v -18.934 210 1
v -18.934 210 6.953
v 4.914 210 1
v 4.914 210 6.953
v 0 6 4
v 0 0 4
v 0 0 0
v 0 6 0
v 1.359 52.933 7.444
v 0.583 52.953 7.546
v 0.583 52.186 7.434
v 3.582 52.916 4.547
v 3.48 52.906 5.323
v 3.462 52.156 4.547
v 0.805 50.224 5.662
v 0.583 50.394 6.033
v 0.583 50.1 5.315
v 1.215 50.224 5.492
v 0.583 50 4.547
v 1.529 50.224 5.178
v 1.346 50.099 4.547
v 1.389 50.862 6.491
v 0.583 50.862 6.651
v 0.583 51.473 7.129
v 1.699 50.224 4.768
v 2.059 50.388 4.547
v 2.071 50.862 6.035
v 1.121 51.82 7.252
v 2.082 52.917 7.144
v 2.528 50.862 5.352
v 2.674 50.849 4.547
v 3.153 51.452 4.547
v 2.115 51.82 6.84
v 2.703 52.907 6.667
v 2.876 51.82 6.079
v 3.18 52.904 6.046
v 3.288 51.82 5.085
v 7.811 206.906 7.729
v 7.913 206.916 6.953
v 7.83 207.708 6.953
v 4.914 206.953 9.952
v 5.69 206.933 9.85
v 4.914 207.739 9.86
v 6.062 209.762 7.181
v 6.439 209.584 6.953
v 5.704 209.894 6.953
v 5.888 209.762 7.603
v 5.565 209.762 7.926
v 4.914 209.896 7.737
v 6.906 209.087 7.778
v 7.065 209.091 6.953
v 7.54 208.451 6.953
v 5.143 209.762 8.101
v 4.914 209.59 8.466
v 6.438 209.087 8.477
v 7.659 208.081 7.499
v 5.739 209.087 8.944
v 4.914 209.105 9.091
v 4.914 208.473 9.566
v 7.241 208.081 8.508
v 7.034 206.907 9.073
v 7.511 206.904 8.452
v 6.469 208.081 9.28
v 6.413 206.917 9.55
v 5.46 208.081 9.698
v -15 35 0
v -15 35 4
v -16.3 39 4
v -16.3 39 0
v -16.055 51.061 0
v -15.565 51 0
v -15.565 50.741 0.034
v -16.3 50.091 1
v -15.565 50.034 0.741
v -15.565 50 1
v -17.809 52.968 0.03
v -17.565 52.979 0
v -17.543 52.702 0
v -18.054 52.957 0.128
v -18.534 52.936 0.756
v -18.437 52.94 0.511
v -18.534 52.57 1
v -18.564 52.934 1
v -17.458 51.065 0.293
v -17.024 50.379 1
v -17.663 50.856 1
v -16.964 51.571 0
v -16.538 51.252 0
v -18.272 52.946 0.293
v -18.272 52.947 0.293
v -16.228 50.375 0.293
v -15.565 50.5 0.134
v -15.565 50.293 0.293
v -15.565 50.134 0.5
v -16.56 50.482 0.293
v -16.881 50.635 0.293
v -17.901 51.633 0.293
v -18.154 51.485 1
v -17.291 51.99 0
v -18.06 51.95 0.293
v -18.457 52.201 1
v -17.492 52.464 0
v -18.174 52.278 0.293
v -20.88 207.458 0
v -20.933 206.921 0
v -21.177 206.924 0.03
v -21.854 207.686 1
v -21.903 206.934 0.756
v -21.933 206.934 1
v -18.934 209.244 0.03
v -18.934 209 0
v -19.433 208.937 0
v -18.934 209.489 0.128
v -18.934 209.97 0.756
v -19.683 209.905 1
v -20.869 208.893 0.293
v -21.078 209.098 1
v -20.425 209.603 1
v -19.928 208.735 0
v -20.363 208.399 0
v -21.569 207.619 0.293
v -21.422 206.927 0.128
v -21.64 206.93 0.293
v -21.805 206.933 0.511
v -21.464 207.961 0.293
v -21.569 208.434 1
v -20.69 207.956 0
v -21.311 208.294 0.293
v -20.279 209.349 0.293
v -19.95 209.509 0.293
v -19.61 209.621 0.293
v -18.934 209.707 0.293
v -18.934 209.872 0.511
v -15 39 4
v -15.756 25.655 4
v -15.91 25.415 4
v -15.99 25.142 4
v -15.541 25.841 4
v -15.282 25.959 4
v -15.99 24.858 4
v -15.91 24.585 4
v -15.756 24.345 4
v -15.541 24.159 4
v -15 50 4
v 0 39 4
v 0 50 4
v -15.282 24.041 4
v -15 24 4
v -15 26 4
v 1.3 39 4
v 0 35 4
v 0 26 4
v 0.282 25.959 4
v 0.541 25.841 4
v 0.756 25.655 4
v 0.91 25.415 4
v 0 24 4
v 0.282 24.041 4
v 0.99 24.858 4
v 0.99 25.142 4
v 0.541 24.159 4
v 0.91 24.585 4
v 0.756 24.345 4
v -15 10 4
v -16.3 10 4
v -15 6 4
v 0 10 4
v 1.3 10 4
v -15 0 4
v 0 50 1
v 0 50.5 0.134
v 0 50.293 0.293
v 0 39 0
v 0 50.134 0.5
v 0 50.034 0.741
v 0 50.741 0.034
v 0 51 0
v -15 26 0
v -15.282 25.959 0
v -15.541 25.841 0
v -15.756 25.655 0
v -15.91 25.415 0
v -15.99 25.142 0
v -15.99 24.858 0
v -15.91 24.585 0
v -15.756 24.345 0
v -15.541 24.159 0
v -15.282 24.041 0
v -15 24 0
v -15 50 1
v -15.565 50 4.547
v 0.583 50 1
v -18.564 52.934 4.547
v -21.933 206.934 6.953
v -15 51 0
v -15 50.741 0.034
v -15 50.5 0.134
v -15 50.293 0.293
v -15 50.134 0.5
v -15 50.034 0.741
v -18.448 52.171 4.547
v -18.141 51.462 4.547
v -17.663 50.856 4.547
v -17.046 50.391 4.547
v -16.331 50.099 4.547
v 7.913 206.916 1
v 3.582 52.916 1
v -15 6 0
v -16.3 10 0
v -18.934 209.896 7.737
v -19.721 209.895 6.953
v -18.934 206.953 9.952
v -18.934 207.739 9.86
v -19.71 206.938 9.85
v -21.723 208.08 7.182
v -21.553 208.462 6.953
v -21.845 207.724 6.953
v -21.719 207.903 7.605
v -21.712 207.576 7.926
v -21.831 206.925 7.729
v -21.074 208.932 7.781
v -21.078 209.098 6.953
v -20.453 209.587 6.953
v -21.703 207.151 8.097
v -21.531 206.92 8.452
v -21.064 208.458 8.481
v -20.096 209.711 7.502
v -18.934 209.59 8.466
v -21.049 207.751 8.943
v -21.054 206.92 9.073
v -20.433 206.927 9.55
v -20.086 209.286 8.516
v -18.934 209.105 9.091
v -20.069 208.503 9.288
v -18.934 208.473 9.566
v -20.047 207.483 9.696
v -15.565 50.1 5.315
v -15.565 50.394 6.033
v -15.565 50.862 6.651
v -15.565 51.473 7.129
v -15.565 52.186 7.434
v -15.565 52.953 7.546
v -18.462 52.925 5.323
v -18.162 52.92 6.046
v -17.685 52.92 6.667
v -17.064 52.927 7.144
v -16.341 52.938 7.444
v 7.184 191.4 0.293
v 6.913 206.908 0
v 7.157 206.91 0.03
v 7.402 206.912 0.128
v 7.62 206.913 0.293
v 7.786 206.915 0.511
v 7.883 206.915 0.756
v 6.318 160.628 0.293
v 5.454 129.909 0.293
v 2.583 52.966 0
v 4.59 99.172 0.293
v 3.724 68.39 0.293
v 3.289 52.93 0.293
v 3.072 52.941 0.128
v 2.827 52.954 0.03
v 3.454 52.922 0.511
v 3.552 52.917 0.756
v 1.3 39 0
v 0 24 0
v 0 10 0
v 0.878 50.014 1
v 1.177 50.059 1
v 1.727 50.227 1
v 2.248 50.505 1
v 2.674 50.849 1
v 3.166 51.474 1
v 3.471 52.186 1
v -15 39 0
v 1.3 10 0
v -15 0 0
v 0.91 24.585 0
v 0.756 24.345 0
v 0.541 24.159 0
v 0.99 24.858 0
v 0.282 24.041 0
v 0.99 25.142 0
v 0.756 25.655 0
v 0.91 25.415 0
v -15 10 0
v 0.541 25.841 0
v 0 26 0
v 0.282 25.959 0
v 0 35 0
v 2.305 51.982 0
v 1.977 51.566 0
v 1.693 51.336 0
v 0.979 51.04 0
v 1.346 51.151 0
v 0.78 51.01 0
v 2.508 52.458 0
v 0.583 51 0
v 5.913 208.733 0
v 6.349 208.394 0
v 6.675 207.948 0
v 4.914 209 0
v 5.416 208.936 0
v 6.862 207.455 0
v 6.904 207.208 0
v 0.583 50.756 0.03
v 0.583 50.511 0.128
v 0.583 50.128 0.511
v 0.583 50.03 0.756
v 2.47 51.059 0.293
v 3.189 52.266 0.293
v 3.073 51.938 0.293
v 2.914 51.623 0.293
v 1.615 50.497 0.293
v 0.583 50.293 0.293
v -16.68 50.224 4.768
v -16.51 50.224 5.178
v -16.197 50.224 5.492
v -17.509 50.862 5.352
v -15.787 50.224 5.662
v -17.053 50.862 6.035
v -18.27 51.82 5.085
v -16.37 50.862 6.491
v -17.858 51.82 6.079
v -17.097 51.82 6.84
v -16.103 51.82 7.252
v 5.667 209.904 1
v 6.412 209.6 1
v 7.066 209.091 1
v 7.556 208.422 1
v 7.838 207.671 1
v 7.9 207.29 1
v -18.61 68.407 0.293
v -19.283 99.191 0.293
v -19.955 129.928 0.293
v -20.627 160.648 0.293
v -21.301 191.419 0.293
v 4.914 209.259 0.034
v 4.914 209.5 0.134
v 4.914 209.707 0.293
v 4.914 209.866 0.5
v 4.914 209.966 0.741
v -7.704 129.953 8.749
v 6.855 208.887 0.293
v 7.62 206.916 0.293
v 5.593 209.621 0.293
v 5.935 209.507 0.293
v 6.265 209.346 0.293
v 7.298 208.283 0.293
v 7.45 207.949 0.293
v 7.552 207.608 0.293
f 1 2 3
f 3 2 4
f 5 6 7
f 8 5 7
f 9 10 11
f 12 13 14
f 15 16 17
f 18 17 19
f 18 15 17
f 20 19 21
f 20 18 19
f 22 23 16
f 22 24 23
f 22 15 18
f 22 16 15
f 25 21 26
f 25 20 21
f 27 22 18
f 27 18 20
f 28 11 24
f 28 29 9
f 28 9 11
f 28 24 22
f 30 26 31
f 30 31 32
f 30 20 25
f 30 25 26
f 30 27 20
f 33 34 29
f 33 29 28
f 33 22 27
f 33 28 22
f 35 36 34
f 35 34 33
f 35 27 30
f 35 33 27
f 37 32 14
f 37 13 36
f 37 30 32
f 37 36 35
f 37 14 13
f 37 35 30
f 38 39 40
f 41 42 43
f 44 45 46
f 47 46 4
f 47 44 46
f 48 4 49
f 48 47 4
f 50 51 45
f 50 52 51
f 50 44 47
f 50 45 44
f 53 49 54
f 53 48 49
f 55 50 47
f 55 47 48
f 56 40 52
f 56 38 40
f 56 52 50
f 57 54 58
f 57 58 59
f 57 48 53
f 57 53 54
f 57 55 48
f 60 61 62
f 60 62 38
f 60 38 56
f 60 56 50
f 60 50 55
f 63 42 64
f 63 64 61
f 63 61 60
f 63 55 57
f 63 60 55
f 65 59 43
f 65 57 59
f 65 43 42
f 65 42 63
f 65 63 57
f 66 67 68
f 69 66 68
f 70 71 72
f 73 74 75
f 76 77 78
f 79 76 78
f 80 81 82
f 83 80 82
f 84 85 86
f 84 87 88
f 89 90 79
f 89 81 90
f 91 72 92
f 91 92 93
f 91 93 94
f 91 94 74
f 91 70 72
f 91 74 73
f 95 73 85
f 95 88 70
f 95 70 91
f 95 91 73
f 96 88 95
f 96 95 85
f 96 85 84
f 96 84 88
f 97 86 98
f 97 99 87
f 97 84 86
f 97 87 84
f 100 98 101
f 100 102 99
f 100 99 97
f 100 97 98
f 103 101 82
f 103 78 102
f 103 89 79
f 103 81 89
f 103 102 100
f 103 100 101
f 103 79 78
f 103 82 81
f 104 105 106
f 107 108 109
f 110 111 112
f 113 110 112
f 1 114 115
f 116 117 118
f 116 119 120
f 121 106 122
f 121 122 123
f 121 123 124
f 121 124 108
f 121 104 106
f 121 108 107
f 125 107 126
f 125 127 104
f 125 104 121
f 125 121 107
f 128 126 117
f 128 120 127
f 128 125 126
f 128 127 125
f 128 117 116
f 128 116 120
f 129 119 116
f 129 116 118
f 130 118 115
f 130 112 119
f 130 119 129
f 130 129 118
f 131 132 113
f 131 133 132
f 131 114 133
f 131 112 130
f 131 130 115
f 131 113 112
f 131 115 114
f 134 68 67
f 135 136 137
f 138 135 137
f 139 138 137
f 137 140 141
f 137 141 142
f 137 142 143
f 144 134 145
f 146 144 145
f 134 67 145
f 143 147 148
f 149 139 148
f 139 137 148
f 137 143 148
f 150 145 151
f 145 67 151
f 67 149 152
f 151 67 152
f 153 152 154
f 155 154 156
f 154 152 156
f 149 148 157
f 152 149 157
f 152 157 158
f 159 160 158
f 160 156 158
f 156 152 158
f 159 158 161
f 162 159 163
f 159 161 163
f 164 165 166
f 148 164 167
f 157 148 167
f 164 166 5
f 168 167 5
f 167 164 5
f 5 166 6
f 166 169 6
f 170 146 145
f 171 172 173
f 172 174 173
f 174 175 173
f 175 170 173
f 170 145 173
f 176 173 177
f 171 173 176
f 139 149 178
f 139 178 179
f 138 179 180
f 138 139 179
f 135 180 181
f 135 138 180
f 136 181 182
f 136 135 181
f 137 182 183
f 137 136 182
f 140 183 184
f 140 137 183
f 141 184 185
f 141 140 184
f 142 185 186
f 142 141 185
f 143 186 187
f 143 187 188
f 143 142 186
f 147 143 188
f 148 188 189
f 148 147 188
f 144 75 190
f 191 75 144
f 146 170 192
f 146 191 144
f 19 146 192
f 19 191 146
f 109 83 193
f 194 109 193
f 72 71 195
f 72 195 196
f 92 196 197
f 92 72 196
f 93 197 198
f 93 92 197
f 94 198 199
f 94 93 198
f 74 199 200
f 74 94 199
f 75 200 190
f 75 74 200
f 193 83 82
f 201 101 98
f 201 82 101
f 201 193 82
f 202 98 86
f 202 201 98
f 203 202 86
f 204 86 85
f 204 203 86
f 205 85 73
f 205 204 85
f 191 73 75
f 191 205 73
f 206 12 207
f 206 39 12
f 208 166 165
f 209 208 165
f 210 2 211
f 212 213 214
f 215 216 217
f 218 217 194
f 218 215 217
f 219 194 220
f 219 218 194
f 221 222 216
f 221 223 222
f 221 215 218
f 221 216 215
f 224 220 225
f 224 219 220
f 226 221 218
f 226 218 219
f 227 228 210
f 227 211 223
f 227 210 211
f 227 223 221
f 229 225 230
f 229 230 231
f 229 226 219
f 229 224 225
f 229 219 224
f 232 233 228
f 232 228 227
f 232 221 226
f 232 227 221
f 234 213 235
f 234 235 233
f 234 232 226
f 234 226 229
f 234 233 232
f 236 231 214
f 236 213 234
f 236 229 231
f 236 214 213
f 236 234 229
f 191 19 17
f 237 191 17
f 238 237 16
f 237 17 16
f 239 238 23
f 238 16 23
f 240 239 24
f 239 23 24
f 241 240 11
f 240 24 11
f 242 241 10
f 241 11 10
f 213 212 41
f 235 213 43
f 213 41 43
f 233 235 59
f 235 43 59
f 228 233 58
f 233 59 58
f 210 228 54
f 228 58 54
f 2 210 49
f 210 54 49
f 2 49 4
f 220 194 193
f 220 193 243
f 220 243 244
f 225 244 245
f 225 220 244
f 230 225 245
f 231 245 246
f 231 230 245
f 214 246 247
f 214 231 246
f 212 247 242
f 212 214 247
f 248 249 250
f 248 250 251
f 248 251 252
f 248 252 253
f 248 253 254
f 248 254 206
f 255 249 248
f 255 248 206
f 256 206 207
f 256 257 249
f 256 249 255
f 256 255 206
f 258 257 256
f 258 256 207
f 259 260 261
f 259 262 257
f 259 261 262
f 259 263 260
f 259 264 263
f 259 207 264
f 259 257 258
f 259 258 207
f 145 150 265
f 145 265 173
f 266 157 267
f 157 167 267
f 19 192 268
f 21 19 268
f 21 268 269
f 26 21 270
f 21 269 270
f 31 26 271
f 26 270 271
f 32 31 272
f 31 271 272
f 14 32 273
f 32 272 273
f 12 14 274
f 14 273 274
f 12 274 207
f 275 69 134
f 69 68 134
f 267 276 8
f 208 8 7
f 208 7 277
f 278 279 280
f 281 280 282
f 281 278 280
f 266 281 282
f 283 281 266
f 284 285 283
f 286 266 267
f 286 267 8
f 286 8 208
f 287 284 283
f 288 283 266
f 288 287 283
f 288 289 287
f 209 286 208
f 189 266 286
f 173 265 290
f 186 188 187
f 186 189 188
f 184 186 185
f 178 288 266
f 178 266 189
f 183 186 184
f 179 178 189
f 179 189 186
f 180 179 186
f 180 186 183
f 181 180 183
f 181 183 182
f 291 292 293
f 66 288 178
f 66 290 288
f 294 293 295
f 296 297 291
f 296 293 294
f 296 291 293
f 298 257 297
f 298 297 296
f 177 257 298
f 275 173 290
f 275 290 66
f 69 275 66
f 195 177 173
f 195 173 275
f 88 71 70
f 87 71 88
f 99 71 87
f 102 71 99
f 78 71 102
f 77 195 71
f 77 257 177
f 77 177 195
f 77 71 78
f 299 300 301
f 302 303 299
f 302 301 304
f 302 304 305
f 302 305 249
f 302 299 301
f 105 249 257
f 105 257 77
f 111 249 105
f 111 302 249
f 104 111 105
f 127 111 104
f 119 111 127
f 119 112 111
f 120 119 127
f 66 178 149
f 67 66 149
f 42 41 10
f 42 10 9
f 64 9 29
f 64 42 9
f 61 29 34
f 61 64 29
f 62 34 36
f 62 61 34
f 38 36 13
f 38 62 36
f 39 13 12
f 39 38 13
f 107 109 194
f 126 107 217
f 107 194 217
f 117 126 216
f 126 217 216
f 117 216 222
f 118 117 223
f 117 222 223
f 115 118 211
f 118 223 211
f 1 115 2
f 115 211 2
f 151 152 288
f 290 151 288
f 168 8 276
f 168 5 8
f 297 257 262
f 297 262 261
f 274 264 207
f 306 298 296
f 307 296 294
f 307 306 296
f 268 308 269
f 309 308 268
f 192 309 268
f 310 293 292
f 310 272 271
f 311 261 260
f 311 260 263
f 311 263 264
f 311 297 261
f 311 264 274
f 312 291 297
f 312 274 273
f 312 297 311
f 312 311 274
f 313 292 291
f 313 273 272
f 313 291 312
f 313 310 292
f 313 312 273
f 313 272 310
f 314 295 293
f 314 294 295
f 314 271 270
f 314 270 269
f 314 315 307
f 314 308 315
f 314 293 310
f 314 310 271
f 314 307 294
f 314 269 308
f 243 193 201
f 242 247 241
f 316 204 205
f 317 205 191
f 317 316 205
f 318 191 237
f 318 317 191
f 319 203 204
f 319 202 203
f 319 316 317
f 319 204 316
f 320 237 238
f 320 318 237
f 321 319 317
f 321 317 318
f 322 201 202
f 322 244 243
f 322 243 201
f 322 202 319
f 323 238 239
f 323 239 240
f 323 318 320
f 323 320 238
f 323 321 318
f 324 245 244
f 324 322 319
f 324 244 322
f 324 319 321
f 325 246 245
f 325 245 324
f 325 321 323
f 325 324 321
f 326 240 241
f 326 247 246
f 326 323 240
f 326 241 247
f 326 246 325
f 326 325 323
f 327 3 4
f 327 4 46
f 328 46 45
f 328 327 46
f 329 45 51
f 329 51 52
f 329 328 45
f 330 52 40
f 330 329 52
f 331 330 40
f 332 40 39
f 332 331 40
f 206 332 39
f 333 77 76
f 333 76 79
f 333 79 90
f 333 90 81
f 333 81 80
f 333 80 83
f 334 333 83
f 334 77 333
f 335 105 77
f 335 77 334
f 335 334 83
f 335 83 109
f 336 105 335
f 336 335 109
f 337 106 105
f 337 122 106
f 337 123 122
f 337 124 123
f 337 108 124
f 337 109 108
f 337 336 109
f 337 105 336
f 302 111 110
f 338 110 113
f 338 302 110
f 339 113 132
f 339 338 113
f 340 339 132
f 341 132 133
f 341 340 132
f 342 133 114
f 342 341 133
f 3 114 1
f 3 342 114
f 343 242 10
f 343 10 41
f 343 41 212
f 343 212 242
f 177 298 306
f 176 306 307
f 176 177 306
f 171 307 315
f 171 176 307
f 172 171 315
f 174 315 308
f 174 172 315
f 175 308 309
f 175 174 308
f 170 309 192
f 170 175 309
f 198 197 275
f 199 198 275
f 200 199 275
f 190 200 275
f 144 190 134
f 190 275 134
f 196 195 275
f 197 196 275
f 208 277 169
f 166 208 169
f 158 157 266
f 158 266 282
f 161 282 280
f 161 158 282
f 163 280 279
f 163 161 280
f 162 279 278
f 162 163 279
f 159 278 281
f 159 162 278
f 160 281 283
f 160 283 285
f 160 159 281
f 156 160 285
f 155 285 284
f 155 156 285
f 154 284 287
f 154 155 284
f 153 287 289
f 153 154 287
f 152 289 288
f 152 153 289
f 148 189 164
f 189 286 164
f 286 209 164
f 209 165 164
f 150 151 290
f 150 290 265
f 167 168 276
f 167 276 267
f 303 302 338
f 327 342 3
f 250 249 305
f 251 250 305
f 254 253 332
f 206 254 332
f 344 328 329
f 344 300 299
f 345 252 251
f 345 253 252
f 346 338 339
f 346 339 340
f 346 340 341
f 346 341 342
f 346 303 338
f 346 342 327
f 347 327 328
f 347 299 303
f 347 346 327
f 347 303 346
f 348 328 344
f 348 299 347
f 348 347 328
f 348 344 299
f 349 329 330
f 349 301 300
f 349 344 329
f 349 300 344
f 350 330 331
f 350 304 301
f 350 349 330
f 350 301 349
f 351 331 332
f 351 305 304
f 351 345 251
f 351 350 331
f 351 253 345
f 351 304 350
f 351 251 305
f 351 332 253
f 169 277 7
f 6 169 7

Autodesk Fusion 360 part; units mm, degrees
sketch "Sketch1" plane through (0, 0, 0) normal (0, 1, 0) x (1, 0, 0)
  line L0 (0, 0) -> (-15, 0)
  line L1 (-15, 0) -> (-15, -4)
  line L2 (-15, -4) -> (0, -4)
  line L3 (0, -4) -> (0, 0)
  dimension "d1" = 4
  dimension "d2" = 15
extrude "Extrude1" add sketch "Sketch1" along normal blind 50
sketch "Sketch2" plane through (0, 50, 0) normal (0, 1, 0) x (-1, 0, 0)
  line L0 (0, 4) -> (0, 0)
  line L1 (0, 0) -> (15, 0)
  line L2 (15, 0) -> (15, 4)
  line L3 (15, 4) -> (0, 4)
  line L4 (-3.5, 0) -> (18.5, 0)
  line L5 (18.5, 0) -> (18.5, 7.5)
  line L6 (18.5, 7.5) -> (-3.5, 7.5)
  line L7 (-3.5, 7.5) -> (-3.5, 0)
  dimension "d5" = 3.5
  dimension "d6" = 3.5
  dimension "d7" = 3.5
ref_plane "WorkPlane1" through (-7.5, 210, 2) normal (0, 1, 0) x (-1, 0, 0)
sketch "Sketch3" plane through (0, 210, 0) normal (0, 1, 0) x (1, 0, 0)
  line L0 (8, 0) -> (-22, 0)
  line L1 (-22, 0) -> (-22, -10)
  line L2 (-22, -10) -> (8, -10)
  line L3 (8, -10) -> (8, 0)
  dimension "d9" = 22
  dimension "d10" = 8
  dimension "d11" = 10
loft "Loft1" add profiles "Sketch2", "Sketch3" section 1 section 2
fillet "Fillet1" radius 3 8 edges at (5.75, 130, 8.75) (-7, 210, 10) (-20.25, 130, 8.75) (-22, 210, 5) (8, 210, 5) (-18.5, 50, 3.75) (-7.5, 50, 7.5) (3.5, 50, 3.75)
fillet "Fillet2" radius 1 9 edges at (-15.2825, 50, 0) (-17.6629, 50.8556, 0) (-20.2486, 129.9344, 0) (-21.078, 209.098, 0) (-7.0096, 210, 0) (7.0654, 209.0913, 0) (5.7476, 129.9157, 0) (2.6745, 50.8491, 0) (0.2916, 50, 0)
sketch "Sketch4" plane through (0, 0, 4) normal (0, 0, 1) x (-1, 0, 0)
  line L0 (15, 0) -> (0, 0)
  line L1 (0, 0) -> (0, -50)
  line L2 (0, -50) -> (15, -50)
  line L3 (15, -50) -> (15, 0)
  line L4 (7.5, 0) -> (7.5, -50)
  circle A0 centre (0, -25) radius 1
  line L5 (7.5, -25) -> (0, -25)
  line L6 (0, -6) -> (-1.3, -10)
  line L7 (-1.3, -10) -> (0, -10)
  line L8 (0, -35) -> (-1.3, -39)
  line L9 (-1.3, -39) -> (0, -39)
  line L10 (15, -6) -> (16.3, -10)
  line L11 (16.3, -10) -> (15, -10)
  circle A1 centre (15, -25) radius 1
  line L12 (15, -35) -> (16.3, -39)
  line L13 (16.3, -39) -> (15, -39)
  dimension "d16" = 2
  dimension "d17" = 6
  dimension "d18" = 1.3
  dimension "d19" = 4
  dimension "d20" = 4
  dimension "d21" = 10
  dimension "d22" = 1.3
extrude "Extrude2" add sketch "Sketch4" against normal blind 4 contours L3 L10 L11 | L1 L6 L7 | L3 A1 | L1 A0 | L1 L8 L9 | L3 L12 L13 picked at (15.3299, -25.0474)
equation "d6 = d5"
equation "d7 = d5"
equation "d20 = d19"
equation "d22 = d18"
